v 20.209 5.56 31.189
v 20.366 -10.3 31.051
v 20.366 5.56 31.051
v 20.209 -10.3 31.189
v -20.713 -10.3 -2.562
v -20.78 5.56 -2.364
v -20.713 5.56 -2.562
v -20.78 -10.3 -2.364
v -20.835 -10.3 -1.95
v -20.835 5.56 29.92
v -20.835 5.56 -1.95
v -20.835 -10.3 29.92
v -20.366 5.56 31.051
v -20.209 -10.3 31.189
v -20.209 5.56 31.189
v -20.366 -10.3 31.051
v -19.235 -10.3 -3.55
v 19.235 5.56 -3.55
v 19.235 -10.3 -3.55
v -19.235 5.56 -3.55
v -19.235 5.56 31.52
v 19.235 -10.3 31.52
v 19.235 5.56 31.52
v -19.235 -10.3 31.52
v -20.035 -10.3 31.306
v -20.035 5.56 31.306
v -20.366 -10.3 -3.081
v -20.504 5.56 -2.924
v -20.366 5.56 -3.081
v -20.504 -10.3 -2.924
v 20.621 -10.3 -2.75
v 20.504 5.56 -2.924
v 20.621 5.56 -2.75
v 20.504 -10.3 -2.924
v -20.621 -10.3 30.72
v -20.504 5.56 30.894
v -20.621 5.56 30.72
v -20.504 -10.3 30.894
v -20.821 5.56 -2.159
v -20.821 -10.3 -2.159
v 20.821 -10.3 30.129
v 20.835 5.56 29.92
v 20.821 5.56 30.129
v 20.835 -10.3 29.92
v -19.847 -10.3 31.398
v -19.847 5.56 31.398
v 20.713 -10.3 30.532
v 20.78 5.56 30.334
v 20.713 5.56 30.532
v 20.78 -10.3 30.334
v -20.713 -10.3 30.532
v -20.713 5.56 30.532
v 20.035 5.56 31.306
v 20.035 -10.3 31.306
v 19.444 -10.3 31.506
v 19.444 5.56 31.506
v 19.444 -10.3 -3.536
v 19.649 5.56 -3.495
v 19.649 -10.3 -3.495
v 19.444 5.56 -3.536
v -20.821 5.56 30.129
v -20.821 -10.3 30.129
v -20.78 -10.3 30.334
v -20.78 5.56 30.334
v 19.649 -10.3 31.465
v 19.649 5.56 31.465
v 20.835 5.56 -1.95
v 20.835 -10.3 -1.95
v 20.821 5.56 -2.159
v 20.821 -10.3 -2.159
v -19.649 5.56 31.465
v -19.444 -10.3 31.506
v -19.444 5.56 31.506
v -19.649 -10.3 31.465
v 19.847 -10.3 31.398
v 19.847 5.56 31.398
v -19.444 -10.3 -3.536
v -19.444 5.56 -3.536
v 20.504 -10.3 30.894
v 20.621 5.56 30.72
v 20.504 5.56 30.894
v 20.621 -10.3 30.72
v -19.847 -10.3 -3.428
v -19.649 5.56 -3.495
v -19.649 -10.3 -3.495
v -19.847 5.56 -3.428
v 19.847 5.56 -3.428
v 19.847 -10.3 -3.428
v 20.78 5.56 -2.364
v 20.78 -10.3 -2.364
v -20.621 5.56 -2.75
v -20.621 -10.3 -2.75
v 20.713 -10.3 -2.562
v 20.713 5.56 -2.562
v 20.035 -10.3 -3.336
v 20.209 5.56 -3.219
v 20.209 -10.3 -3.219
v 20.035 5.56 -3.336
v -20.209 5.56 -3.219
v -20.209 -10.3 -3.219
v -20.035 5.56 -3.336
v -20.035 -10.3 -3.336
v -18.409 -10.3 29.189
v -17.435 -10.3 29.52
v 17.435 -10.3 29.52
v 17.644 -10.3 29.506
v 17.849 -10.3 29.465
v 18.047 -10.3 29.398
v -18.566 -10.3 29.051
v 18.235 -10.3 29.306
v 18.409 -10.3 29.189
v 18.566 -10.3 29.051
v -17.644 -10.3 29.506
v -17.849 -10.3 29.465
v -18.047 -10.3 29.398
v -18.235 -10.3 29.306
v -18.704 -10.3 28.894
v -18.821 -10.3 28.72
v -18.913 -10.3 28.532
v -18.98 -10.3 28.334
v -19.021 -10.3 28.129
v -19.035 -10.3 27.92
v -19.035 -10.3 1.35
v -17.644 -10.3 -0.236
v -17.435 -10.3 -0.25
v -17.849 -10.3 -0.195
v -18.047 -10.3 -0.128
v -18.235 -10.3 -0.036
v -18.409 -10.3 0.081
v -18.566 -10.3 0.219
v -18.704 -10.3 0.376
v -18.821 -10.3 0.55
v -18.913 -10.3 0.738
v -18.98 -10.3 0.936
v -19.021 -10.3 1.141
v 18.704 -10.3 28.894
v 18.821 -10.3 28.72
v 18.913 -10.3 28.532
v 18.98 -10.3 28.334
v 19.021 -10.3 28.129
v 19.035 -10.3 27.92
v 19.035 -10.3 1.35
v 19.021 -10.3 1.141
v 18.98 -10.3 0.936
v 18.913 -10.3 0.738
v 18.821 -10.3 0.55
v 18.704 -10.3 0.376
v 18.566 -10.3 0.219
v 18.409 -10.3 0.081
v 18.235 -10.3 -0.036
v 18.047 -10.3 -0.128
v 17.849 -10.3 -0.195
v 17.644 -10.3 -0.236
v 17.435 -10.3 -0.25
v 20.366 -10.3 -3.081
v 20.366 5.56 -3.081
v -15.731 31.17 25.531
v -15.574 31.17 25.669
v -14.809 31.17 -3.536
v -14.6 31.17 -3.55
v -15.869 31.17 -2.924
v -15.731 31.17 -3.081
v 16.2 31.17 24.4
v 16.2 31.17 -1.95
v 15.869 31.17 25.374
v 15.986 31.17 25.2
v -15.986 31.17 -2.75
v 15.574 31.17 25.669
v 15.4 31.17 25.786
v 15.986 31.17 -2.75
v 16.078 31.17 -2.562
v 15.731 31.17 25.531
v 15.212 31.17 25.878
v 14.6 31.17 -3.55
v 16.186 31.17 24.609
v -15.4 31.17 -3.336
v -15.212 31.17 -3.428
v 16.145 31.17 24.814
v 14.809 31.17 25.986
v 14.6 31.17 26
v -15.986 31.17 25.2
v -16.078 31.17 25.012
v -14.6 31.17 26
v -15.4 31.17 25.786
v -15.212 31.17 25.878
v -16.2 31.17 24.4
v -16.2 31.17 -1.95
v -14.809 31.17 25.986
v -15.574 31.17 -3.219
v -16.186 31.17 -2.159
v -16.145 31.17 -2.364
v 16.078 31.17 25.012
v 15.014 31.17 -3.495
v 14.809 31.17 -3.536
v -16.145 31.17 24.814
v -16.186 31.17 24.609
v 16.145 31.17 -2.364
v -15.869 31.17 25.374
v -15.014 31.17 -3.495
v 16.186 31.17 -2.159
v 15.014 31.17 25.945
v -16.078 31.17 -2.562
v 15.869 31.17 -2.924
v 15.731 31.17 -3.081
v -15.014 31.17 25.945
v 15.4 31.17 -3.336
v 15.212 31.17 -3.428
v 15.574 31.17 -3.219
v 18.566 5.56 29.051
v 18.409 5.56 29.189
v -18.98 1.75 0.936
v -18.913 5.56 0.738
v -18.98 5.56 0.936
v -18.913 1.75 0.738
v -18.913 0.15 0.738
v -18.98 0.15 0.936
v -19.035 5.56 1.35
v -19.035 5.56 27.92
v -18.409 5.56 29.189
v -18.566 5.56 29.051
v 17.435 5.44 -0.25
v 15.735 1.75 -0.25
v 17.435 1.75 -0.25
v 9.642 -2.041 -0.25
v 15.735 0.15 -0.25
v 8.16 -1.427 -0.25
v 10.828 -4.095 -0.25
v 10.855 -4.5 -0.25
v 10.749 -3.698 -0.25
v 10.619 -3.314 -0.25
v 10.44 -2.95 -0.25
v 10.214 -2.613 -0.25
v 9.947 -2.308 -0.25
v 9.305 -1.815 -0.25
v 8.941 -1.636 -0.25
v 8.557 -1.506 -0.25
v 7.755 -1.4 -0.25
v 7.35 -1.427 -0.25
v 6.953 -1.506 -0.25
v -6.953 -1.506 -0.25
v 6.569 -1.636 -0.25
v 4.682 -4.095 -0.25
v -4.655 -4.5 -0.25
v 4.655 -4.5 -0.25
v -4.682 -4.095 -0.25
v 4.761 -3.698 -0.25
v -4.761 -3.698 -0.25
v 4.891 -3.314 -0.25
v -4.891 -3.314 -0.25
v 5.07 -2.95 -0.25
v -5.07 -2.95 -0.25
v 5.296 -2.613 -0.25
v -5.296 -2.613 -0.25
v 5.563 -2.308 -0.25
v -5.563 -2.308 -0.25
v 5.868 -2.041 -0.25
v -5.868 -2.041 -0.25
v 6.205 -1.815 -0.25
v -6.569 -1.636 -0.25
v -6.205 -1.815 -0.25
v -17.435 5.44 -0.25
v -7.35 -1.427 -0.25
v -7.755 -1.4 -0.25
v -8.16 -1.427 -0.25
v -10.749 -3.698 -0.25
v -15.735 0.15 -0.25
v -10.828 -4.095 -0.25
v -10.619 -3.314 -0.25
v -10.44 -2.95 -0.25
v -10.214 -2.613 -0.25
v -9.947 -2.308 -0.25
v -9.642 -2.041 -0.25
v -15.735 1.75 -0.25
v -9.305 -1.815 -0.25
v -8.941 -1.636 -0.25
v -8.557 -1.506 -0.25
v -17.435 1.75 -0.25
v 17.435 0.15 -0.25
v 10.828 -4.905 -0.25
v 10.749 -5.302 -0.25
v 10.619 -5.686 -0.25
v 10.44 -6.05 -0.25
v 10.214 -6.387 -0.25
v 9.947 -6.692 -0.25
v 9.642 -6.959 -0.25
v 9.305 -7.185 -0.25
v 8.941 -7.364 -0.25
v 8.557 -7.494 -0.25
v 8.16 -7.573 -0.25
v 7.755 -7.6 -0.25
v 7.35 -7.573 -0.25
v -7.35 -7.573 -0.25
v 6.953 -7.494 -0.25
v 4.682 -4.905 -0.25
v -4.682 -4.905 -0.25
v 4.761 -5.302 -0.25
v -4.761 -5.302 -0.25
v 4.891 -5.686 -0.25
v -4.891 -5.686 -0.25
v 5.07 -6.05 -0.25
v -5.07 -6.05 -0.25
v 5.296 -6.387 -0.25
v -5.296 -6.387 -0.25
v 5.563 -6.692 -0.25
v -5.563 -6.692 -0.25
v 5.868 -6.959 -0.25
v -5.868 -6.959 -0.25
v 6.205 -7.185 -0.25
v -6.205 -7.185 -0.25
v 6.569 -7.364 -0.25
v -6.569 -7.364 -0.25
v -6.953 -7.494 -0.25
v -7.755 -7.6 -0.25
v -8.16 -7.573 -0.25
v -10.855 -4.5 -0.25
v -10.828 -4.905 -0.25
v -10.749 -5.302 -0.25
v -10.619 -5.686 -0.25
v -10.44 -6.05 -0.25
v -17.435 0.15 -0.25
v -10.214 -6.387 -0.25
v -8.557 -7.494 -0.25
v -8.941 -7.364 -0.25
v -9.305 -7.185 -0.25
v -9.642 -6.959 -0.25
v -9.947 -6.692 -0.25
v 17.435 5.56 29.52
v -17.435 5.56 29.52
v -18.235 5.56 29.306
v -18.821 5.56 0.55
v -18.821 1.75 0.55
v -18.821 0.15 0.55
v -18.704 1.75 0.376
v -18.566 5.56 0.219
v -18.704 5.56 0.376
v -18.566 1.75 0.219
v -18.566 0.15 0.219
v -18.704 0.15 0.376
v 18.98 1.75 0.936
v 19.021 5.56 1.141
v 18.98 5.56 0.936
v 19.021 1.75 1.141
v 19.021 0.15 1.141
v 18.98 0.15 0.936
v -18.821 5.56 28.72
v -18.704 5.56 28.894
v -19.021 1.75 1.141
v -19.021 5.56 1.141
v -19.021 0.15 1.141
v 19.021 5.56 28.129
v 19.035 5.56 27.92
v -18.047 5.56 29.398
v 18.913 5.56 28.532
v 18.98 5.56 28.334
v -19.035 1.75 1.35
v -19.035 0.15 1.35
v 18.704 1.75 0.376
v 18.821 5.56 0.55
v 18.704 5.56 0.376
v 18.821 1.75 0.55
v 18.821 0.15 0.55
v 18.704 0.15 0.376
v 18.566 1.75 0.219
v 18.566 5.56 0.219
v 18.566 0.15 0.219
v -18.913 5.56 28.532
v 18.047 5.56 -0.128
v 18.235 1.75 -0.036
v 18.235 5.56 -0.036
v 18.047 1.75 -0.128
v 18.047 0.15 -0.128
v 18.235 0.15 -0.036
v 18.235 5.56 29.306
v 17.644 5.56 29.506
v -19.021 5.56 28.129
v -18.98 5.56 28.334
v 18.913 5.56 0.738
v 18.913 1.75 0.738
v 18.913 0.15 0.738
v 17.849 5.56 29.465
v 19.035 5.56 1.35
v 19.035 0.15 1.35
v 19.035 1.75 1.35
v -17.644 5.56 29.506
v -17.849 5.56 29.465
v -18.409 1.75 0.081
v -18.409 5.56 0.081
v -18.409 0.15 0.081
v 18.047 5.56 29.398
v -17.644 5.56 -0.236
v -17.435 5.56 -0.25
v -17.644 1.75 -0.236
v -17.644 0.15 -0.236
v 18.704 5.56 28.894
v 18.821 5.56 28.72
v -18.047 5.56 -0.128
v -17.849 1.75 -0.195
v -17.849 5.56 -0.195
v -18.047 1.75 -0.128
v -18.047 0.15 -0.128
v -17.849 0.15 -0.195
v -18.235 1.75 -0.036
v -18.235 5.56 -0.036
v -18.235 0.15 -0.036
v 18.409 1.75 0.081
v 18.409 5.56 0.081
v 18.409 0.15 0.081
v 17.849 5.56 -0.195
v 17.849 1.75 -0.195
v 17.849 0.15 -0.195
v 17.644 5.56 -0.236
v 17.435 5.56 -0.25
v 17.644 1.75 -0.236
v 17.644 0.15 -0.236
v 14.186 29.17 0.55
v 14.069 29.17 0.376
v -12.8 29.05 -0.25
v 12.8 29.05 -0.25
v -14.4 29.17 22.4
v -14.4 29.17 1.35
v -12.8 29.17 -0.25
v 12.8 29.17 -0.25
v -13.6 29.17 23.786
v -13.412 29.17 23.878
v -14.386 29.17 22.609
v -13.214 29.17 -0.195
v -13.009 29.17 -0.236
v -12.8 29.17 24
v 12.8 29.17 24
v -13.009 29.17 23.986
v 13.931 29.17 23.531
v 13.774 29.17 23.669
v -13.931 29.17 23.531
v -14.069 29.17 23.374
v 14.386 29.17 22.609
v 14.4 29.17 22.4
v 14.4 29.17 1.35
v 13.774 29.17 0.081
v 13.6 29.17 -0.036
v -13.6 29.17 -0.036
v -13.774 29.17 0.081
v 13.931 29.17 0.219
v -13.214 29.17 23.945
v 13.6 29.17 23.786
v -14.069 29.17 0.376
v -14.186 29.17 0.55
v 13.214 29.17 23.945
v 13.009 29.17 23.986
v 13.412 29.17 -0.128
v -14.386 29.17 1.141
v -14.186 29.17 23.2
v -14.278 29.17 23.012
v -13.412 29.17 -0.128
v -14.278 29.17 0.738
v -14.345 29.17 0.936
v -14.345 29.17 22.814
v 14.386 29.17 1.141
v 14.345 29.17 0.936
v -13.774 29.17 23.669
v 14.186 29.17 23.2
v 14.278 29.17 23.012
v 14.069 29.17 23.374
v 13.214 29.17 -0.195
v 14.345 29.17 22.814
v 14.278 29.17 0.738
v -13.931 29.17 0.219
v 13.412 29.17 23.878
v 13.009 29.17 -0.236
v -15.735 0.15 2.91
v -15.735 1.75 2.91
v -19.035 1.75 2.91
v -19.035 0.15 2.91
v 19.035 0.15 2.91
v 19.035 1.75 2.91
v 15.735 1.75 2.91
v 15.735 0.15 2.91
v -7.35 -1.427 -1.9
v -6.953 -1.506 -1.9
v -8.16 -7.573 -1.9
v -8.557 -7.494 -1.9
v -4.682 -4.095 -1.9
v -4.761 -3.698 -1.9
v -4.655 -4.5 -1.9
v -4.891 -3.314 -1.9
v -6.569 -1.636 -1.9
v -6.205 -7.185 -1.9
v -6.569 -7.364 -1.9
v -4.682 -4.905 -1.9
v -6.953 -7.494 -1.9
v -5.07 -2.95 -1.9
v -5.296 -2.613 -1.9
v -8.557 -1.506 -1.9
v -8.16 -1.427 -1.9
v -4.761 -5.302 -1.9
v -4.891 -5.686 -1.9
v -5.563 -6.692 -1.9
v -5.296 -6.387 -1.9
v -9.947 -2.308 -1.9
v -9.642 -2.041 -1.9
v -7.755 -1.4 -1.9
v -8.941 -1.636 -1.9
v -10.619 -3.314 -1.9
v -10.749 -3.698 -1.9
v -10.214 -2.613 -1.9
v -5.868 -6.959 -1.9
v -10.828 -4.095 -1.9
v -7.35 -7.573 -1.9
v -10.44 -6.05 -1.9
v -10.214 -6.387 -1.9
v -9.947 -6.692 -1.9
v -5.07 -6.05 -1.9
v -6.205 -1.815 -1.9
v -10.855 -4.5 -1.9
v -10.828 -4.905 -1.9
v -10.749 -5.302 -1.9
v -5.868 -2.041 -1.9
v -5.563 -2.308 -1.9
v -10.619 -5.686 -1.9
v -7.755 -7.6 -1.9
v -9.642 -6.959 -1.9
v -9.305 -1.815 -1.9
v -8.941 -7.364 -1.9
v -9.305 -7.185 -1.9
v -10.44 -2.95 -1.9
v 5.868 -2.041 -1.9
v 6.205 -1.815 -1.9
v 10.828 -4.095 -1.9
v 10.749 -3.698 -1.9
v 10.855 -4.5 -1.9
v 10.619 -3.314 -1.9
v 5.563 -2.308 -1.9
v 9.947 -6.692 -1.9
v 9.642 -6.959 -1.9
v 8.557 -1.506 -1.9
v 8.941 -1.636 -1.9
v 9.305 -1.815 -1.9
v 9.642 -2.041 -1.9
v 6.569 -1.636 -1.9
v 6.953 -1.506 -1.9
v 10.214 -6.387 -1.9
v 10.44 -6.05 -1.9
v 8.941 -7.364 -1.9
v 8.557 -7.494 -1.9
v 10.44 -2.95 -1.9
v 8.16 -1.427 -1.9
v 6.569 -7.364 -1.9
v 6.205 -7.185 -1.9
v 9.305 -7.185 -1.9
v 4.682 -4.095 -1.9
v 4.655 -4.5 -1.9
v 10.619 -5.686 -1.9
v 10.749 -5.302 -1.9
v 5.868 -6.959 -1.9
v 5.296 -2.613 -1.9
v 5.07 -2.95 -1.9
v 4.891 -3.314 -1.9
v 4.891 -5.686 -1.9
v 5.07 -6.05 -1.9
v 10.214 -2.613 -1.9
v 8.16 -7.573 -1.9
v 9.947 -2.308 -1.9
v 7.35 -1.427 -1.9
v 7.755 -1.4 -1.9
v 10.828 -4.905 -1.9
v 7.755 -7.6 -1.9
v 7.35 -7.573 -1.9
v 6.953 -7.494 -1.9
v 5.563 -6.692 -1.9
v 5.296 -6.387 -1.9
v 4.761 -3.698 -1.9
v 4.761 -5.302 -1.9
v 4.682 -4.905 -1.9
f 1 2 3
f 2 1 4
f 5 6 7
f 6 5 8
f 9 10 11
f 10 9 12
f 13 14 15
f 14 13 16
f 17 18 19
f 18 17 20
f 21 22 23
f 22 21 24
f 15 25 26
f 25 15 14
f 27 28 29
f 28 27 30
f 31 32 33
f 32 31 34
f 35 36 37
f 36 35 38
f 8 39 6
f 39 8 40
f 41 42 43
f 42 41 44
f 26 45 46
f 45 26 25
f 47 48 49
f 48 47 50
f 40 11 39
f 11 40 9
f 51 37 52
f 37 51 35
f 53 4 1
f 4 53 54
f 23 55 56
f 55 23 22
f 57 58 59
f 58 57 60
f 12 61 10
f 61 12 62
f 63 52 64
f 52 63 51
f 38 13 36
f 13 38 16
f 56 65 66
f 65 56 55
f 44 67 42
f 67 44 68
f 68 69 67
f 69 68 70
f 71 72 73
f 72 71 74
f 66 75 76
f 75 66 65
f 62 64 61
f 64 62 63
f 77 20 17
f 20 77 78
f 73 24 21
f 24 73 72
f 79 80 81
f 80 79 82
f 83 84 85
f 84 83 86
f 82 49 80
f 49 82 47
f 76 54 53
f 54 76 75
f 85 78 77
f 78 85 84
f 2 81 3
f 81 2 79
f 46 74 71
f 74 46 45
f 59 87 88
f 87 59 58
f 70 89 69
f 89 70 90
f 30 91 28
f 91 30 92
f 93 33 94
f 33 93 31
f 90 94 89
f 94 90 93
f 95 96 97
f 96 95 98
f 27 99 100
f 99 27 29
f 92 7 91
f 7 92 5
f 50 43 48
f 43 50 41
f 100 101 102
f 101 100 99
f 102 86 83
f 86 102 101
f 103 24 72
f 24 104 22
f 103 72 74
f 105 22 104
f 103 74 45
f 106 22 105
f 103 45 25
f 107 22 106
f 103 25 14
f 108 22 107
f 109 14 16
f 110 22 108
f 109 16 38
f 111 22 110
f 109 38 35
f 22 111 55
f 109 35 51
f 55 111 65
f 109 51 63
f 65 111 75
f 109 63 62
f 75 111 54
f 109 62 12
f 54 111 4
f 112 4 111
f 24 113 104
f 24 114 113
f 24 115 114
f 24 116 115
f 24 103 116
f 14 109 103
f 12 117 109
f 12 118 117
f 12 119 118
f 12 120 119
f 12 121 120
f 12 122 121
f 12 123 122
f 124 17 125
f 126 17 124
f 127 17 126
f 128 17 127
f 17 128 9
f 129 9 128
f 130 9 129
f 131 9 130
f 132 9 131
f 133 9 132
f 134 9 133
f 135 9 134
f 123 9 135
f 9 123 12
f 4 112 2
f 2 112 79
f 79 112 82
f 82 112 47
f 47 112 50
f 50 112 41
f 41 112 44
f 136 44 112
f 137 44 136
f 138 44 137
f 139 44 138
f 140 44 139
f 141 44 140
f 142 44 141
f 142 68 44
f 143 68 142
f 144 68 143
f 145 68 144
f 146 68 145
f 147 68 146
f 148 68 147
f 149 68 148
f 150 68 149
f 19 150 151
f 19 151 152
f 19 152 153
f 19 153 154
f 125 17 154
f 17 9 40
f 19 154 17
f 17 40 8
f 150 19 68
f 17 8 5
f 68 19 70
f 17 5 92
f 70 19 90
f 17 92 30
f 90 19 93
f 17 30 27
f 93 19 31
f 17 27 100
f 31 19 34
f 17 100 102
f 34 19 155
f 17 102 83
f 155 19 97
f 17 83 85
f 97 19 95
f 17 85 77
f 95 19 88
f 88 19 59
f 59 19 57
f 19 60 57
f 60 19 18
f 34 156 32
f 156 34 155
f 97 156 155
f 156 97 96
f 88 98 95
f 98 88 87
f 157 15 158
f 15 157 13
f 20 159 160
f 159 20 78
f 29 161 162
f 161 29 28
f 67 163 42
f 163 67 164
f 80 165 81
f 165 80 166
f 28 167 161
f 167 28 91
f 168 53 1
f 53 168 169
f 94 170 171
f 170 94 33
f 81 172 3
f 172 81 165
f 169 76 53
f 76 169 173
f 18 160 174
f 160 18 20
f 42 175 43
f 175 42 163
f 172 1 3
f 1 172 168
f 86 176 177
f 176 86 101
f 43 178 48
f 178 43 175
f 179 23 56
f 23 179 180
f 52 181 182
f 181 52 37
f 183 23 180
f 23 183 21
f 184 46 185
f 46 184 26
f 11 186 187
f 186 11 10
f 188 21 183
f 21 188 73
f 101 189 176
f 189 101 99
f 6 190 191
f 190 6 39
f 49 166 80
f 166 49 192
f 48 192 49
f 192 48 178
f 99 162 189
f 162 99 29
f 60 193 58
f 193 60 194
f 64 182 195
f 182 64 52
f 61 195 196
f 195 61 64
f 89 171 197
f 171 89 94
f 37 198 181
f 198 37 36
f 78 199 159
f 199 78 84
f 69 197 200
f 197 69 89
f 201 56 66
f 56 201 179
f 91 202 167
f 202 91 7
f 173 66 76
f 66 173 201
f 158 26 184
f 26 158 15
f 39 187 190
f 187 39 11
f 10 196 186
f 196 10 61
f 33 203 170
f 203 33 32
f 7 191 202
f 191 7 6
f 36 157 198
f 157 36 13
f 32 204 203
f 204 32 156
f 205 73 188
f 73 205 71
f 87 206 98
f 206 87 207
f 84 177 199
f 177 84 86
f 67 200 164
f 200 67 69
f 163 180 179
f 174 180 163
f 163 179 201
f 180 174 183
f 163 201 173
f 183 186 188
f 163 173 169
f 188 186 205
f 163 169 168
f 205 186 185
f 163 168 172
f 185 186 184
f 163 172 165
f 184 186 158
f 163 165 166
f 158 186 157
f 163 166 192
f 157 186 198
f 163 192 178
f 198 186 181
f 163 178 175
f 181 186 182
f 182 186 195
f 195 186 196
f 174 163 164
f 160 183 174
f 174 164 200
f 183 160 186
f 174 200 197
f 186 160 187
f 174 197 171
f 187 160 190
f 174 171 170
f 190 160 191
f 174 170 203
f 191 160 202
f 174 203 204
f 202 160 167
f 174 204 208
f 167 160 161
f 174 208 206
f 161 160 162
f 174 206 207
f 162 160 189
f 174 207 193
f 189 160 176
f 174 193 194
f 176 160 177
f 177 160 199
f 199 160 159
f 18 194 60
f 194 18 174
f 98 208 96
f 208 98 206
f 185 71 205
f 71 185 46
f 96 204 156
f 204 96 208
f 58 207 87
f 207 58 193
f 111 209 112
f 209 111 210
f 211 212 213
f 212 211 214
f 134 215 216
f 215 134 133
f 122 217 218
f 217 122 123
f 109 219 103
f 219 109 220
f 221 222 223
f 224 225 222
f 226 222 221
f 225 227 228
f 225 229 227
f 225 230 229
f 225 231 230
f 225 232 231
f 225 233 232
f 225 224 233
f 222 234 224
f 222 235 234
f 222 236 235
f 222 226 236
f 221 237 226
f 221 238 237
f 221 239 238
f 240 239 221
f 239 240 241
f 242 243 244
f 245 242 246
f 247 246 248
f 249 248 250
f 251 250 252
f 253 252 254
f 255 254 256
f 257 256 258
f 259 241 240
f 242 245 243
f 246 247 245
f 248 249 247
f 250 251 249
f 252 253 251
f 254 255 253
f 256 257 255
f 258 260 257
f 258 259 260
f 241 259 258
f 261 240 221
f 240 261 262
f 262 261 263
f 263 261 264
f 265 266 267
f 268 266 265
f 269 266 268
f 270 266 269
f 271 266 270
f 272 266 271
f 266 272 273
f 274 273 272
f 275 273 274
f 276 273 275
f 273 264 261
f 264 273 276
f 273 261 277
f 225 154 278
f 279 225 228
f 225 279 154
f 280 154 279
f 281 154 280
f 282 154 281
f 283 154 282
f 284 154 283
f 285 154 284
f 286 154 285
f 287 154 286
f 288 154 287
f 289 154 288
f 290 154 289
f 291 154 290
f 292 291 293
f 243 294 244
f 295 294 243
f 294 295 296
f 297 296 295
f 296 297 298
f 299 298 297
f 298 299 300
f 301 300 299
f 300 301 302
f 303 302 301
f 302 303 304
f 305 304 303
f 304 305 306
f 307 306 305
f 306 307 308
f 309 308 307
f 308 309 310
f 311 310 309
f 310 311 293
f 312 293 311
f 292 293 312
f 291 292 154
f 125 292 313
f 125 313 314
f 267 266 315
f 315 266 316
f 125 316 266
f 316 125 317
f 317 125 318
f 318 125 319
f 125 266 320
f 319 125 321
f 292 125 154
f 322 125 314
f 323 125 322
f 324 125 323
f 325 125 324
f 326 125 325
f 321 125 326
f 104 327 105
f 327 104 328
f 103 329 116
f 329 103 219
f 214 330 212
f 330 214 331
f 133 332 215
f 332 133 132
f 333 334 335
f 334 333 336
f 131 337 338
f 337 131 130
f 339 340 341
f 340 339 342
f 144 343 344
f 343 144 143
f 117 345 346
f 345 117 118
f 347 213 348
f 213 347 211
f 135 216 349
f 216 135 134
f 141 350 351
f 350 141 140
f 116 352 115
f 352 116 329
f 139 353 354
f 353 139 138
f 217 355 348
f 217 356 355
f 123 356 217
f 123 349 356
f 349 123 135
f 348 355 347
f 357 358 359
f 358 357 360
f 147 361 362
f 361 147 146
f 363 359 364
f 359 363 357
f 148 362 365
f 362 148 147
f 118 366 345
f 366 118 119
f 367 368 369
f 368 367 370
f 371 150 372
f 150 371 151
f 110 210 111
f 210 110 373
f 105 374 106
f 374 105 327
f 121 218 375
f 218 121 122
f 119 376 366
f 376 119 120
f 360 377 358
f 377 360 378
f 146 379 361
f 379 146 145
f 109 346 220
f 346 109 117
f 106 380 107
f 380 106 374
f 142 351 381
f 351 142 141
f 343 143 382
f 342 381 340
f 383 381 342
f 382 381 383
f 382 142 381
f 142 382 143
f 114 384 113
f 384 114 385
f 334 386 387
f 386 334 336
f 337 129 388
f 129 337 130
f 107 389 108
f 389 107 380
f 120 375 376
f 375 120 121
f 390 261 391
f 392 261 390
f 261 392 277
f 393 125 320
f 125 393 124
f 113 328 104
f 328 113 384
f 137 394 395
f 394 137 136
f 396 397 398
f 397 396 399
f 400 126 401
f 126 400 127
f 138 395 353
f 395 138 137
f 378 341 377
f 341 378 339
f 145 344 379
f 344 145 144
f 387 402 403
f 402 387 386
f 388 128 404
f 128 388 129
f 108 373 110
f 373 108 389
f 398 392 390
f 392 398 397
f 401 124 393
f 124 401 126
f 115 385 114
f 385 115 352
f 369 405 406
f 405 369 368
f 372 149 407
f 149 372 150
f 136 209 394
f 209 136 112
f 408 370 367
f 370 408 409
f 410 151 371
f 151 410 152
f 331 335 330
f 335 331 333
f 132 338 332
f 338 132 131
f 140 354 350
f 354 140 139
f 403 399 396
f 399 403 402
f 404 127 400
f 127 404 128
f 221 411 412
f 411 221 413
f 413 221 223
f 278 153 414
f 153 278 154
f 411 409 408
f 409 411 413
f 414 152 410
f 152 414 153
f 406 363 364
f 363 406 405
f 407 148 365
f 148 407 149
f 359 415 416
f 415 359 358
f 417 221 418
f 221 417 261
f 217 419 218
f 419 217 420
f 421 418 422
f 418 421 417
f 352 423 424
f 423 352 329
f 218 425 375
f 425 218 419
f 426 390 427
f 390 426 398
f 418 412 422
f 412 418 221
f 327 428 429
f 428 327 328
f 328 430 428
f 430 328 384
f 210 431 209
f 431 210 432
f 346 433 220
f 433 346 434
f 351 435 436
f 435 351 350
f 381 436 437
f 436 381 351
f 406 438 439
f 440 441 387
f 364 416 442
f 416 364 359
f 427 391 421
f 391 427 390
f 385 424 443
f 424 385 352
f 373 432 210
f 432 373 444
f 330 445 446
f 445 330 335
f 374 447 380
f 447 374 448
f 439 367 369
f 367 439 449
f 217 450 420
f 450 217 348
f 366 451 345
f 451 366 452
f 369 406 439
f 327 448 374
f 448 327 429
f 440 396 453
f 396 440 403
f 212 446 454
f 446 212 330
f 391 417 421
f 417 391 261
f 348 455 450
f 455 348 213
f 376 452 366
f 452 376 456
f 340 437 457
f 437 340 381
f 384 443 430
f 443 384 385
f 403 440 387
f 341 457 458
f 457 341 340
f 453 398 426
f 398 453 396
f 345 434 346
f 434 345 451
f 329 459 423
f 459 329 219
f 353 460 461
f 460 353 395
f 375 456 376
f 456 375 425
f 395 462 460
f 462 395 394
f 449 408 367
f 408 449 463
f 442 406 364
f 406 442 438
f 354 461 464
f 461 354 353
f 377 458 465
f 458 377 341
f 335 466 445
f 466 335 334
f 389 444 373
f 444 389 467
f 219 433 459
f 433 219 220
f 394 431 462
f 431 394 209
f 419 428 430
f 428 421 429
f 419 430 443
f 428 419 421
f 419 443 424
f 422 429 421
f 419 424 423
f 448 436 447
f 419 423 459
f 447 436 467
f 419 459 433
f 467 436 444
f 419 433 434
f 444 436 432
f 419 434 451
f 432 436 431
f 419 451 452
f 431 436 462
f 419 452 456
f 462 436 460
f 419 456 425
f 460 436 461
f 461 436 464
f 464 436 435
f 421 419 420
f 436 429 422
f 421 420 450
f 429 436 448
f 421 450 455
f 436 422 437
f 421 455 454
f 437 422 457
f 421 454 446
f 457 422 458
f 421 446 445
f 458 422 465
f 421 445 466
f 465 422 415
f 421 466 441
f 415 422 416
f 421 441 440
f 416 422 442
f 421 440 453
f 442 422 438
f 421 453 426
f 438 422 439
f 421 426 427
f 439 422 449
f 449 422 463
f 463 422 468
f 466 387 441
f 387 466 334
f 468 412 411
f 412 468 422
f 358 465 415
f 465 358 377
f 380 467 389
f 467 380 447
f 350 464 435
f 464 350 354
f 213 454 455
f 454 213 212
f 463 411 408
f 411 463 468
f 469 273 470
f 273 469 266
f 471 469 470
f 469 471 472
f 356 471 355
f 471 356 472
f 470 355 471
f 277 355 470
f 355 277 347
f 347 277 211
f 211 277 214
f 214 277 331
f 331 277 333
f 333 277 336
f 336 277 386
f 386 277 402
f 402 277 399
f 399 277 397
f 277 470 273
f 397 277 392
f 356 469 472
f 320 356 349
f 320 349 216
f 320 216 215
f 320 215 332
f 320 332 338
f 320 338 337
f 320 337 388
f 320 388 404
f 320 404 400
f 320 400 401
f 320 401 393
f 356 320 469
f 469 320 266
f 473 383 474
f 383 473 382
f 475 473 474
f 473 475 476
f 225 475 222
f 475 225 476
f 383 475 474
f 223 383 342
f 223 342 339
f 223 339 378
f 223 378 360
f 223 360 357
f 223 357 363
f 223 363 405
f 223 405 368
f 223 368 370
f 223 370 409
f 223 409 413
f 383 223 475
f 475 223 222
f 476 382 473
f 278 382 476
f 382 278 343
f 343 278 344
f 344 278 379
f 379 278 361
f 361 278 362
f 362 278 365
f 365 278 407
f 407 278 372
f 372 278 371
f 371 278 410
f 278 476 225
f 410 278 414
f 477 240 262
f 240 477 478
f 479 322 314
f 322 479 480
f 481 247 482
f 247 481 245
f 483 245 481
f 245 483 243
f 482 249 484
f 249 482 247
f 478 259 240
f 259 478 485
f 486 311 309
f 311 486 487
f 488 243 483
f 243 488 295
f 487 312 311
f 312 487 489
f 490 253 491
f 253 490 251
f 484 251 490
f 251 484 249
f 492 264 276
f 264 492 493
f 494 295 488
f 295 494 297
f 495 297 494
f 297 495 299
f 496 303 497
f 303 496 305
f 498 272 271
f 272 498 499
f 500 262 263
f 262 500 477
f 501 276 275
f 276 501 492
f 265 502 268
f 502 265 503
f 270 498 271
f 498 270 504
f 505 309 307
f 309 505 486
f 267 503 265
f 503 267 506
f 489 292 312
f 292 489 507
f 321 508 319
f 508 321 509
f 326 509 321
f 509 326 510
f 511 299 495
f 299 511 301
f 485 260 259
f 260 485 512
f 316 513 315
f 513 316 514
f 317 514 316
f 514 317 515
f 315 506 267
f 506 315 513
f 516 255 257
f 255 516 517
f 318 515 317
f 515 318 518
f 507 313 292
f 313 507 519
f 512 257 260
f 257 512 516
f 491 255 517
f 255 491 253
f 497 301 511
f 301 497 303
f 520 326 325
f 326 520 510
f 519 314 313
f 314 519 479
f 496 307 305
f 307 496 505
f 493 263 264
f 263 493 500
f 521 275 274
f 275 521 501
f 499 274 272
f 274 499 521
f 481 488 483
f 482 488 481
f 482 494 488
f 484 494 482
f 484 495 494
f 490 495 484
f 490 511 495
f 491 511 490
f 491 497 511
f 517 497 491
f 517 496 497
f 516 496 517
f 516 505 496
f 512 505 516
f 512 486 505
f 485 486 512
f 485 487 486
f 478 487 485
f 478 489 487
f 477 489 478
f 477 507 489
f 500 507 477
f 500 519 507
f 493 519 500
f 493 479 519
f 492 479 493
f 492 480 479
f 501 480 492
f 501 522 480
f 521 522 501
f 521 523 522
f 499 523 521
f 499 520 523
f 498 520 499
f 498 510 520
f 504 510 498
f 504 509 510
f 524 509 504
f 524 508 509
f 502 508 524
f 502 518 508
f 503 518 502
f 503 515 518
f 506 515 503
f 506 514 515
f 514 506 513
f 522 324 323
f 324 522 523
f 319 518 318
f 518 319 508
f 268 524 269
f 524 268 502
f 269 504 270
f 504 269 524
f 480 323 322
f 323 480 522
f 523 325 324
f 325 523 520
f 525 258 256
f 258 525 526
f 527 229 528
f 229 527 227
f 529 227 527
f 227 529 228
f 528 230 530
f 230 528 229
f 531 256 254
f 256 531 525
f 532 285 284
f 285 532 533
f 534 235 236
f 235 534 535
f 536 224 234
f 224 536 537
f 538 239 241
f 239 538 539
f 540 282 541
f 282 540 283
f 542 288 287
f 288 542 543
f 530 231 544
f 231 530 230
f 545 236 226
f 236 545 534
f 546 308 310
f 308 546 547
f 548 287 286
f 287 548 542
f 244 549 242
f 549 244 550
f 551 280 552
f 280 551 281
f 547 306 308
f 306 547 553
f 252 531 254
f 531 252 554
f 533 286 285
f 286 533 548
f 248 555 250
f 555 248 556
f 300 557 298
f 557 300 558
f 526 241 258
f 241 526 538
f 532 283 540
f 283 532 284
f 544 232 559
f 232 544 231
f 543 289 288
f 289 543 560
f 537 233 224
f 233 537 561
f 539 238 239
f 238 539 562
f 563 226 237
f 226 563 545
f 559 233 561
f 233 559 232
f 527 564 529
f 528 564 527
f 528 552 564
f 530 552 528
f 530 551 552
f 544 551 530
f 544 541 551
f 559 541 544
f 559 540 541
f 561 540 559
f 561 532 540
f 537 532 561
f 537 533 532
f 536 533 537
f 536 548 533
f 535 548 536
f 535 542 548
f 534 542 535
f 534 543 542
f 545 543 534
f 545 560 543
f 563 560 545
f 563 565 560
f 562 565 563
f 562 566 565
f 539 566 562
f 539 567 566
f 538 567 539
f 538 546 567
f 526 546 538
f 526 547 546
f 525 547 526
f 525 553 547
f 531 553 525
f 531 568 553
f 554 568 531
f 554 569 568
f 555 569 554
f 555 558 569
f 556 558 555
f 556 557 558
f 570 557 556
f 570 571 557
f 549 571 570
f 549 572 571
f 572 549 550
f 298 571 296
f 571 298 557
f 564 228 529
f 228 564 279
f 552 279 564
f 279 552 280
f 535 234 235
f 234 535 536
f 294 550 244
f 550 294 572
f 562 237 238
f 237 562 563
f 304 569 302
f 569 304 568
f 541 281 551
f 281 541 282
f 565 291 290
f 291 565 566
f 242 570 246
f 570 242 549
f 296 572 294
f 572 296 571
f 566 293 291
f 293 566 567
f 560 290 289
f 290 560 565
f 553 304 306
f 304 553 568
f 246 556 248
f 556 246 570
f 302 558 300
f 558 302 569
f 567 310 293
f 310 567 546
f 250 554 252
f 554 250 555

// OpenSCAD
// Publication images from the actual V6 source. No unmeasured key-body or
// lever mockup is represented as a verified fit. CLI supplies insert_thickness.
use <../n0sa_rlp_v3_guard.scad>

view = "hero"; // [hero,nose,print_orientation]
$fn = 48; // Match the source's facet count; use<> does not import special variables.

module guard_color() {
    color([0.78,0.35,0.16]) children();
}

if (view == "hero" || view == "nose") {
    guard_color() full_guard();
} else if (view == "print_orientation") {
    guard_color() printable_guard();
} else assert(false,"Unknown publication view");
